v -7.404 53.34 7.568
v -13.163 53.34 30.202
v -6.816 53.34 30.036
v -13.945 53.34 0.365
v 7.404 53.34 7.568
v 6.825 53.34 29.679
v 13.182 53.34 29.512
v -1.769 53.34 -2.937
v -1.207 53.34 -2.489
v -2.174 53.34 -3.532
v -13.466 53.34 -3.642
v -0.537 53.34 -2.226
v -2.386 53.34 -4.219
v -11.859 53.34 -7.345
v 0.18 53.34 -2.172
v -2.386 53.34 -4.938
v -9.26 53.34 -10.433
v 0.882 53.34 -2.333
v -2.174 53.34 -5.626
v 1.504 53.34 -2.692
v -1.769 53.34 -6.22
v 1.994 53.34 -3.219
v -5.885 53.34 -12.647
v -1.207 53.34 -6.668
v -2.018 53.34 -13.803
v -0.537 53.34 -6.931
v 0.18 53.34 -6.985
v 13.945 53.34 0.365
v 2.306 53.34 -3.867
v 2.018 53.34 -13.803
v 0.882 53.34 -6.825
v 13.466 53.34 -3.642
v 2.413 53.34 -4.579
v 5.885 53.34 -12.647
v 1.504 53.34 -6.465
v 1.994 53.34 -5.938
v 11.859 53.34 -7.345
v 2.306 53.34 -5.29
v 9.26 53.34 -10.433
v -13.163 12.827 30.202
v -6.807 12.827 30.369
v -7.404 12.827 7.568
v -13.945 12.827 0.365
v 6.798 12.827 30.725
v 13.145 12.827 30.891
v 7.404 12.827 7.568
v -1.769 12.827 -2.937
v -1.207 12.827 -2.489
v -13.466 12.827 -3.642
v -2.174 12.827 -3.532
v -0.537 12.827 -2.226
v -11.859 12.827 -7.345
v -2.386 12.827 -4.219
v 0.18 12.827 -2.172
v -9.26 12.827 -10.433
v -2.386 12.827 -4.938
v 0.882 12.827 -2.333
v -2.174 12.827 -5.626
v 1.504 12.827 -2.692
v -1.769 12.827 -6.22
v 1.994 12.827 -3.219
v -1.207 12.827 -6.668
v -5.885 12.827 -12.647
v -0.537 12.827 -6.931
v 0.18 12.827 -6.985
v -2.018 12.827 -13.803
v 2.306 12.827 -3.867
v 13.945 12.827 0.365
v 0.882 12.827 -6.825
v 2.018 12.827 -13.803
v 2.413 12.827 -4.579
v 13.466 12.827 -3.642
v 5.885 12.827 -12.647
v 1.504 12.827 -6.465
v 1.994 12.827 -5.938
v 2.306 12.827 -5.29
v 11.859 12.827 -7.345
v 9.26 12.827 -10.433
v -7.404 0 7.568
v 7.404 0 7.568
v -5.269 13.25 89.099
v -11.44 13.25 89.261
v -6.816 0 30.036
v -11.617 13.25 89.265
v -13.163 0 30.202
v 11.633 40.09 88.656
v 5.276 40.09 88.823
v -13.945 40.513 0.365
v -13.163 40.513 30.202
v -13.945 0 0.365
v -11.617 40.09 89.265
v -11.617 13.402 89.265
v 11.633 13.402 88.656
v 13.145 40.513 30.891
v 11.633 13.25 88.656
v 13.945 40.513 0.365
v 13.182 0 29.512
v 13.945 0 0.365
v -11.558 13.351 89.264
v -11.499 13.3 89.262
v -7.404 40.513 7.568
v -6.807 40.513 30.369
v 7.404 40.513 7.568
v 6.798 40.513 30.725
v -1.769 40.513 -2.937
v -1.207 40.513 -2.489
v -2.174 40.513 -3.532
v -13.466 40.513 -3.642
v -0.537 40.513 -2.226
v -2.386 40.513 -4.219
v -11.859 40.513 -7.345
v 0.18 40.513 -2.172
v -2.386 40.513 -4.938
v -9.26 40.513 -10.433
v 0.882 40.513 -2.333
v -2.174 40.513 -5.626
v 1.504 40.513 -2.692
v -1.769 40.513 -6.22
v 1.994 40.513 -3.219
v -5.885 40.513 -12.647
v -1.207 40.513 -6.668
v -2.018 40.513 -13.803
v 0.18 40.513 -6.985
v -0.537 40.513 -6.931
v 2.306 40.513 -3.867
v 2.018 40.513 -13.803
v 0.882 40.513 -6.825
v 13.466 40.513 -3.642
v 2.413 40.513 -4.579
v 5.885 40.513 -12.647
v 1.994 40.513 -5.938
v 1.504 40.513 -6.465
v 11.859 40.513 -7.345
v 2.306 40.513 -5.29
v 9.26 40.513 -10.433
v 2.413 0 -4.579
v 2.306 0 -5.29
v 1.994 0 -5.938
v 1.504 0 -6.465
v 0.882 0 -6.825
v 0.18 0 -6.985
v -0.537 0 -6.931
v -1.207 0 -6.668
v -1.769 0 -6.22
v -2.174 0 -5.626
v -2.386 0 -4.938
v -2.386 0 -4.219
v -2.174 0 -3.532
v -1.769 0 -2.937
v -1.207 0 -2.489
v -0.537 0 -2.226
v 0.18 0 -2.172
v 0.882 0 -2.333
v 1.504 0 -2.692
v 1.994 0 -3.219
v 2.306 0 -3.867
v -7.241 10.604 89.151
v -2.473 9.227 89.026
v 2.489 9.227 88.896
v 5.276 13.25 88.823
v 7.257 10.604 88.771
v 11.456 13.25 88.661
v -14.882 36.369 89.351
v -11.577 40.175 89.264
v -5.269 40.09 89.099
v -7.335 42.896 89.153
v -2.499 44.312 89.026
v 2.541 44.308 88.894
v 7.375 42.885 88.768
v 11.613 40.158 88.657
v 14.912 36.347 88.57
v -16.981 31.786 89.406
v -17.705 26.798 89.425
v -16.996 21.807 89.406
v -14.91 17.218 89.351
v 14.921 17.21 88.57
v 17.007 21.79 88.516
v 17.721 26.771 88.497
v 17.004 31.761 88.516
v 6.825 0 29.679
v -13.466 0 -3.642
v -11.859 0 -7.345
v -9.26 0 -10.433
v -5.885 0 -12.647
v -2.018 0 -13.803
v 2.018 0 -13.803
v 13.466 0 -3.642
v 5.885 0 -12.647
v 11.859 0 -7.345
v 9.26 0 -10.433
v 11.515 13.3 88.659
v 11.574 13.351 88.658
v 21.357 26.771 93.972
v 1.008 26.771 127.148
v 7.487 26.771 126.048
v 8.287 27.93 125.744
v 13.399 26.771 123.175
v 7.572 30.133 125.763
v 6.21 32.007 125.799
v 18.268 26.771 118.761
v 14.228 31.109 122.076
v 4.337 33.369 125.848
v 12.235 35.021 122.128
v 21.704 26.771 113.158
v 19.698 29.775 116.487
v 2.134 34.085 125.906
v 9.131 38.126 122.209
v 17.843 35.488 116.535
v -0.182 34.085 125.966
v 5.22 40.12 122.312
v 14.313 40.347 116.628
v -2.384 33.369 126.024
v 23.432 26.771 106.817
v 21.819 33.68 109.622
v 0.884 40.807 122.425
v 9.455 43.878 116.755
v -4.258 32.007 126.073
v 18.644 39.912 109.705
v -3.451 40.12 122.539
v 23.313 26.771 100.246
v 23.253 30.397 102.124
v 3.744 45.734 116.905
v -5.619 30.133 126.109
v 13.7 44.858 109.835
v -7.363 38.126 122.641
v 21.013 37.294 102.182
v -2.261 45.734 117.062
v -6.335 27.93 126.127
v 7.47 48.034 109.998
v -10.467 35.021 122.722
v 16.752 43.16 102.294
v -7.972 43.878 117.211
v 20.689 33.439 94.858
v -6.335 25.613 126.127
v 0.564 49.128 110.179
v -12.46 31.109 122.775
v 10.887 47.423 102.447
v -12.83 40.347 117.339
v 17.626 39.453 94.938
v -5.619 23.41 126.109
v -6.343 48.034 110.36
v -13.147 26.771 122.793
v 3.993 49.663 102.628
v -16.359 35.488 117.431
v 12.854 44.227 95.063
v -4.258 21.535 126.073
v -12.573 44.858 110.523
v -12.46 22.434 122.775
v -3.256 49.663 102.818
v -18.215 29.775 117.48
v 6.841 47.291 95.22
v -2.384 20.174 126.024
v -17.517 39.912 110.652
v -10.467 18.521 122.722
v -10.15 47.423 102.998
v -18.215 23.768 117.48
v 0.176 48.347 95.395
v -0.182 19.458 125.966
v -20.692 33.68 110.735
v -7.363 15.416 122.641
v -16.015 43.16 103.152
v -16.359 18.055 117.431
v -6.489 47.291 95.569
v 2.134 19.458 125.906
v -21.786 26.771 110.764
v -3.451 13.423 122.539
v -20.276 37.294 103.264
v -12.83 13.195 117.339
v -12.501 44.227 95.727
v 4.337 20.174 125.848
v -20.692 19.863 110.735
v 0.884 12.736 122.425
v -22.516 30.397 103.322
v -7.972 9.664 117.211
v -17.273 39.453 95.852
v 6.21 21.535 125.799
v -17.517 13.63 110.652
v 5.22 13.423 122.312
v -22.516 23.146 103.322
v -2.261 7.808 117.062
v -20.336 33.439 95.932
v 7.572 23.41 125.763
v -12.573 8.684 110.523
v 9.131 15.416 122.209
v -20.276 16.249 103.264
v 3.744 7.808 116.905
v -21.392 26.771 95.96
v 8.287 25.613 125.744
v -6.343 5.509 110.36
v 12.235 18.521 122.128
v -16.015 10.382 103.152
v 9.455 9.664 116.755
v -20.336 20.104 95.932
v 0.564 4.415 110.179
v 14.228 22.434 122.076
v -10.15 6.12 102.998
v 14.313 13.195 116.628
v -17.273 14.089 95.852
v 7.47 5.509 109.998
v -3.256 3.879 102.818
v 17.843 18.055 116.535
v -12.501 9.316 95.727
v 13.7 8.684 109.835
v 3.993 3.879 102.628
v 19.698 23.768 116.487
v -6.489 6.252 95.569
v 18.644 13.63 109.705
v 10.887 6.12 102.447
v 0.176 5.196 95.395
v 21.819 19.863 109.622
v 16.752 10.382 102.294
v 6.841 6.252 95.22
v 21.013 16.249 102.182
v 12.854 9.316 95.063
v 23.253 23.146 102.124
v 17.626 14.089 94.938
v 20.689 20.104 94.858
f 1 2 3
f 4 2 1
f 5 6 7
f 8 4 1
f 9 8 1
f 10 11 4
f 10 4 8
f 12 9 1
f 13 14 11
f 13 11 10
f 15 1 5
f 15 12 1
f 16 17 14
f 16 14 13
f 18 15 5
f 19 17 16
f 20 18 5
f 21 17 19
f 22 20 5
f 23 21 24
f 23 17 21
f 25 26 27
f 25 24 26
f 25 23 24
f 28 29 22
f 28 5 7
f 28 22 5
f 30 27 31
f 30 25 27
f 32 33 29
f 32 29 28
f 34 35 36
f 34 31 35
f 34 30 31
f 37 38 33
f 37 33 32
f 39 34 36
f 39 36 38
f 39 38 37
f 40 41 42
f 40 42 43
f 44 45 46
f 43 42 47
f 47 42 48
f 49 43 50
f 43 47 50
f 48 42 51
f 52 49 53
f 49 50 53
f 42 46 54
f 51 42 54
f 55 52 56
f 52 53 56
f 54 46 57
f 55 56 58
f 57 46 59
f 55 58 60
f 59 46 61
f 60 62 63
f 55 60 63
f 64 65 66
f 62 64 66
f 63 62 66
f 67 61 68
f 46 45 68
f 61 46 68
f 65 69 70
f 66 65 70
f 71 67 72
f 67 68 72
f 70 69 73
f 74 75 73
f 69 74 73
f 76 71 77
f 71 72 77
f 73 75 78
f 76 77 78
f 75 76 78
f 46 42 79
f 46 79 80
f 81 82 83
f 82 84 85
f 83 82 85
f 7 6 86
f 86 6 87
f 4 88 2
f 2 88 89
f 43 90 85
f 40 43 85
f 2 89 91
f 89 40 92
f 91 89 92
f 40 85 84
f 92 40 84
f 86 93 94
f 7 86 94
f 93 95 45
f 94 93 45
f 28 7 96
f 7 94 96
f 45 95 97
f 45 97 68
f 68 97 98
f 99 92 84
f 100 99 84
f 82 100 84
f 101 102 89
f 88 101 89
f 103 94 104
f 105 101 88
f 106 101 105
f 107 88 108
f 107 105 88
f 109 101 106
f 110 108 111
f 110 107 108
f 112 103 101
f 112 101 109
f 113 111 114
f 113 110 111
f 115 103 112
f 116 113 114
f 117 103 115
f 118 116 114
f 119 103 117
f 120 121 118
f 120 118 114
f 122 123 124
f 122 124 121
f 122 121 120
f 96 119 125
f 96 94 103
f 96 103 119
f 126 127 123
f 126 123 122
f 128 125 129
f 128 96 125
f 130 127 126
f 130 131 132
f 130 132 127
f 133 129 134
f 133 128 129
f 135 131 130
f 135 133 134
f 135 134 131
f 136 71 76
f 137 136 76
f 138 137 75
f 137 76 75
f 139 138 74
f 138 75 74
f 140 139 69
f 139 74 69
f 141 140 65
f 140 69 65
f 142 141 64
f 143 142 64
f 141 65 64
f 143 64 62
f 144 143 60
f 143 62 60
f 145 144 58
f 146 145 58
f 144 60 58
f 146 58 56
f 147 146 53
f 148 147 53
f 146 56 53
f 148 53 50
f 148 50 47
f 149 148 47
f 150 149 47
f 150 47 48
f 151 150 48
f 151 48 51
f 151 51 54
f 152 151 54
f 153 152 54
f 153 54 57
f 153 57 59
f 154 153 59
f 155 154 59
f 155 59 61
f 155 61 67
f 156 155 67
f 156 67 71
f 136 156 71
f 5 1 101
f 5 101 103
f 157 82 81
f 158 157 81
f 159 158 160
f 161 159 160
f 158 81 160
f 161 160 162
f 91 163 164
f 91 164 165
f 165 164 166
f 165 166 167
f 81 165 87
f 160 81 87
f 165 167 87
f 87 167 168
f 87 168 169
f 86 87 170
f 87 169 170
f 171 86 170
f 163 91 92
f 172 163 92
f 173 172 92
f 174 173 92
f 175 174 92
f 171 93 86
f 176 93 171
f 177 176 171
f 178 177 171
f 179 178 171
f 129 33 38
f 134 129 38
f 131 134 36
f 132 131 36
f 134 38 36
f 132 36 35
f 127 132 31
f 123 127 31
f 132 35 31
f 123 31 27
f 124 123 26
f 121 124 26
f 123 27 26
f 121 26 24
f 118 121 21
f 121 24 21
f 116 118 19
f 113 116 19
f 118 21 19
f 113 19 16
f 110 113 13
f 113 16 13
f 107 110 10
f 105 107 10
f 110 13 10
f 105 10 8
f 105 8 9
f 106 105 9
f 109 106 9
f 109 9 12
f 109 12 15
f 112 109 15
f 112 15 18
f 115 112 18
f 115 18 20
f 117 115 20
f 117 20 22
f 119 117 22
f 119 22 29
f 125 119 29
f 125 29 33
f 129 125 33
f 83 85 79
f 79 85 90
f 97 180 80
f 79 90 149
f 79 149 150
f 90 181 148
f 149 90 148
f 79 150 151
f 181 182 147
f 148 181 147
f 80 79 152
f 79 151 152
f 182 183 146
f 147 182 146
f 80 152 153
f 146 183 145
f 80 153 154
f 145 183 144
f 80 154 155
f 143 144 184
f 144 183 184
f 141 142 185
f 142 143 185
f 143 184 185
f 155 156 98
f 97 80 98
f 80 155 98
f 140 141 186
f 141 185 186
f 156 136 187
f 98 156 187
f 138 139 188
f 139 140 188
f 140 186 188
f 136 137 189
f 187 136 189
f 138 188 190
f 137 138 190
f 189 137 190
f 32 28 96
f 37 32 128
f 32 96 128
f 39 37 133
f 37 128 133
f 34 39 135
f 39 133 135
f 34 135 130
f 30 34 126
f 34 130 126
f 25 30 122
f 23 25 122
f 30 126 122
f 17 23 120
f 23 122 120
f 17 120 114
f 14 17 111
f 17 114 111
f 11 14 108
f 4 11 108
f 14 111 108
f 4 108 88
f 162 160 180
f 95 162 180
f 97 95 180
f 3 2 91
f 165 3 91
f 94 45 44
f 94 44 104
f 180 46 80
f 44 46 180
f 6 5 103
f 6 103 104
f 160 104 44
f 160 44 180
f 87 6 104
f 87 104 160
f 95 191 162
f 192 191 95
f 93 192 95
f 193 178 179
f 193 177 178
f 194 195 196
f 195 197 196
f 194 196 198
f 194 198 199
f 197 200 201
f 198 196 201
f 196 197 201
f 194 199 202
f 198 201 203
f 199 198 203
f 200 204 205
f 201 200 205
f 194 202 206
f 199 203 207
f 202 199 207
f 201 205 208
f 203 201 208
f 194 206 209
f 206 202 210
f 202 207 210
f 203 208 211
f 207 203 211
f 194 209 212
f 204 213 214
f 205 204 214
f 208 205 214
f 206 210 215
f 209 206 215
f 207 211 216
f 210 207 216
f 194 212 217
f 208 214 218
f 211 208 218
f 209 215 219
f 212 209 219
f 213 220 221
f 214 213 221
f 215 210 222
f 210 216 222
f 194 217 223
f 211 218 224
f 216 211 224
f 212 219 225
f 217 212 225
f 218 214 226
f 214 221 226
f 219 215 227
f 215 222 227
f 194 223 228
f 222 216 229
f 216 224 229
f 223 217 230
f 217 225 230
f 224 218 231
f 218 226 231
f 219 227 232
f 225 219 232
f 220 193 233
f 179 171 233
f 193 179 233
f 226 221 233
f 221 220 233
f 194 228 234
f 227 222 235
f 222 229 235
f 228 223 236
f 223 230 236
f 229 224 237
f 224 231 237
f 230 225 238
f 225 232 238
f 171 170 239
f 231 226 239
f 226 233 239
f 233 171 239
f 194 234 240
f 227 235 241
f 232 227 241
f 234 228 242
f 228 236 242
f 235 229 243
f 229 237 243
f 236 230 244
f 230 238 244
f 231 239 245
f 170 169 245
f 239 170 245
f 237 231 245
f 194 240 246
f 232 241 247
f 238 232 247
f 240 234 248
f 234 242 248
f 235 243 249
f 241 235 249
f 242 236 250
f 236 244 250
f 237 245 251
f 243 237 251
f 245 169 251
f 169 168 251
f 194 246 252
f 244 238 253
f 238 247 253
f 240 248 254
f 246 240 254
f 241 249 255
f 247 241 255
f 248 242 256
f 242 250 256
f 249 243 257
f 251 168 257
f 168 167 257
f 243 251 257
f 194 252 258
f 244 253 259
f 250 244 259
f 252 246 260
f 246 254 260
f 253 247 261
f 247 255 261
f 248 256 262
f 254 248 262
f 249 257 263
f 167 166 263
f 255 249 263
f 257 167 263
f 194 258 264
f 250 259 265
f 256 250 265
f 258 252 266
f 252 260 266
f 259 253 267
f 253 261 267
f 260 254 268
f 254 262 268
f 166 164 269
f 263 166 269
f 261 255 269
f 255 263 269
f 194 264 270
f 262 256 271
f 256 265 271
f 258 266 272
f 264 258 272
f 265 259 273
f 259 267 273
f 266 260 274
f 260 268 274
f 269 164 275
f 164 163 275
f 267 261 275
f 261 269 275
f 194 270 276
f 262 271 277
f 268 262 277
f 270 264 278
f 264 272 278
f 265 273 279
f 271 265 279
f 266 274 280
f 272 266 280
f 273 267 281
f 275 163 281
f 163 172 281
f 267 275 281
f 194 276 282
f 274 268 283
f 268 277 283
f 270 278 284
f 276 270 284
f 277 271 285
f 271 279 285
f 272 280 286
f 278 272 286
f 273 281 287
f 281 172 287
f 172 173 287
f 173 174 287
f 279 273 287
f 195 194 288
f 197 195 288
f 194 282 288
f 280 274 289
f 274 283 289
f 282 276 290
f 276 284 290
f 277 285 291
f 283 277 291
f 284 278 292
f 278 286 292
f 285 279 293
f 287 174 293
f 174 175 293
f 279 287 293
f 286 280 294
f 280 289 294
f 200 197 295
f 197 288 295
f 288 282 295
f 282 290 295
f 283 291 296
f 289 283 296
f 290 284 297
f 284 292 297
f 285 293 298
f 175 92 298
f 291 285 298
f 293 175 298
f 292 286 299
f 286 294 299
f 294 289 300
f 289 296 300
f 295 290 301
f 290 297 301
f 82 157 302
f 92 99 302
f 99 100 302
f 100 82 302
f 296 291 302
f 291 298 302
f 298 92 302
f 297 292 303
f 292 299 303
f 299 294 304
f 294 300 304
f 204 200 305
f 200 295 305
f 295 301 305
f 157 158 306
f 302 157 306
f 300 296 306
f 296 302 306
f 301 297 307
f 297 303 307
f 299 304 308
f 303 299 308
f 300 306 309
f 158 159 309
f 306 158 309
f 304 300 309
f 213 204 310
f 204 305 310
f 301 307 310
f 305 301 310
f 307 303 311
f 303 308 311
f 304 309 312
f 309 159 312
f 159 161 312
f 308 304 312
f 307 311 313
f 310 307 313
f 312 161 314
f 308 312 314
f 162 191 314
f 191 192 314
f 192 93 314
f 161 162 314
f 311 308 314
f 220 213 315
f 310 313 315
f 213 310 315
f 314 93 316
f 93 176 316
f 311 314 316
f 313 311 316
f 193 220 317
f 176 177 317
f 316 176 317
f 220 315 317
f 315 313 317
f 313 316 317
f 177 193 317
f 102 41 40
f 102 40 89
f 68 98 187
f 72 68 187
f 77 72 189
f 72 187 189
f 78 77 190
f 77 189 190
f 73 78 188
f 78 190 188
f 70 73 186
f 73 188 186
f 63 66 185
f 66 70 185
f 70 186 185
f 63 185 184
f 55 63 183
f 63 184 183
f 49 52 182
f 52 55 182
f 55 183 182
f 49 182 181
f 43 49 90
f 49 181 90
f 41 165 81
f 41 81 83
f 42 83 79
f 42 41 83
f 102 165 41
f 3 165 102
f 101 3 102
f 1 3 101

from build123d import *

# Parameters (mm, degrees)
BOSS_EXTRUDE1_DEPTH     = 53.34
SKETCH4_W               = 61.072672184
SKETCH4_H               = 27.686
CUT_EXTRUDE3_DEPTH      = 125.557157077
SKETCH5_OUTSIDE_W       = 57.352
SKETCH5_OUTSIDE_H       = 152.814
CUT_EXTRUDE5_DEPTH      = 123.51837945
SKETCH6_R               = 2.413
CUT_EXTRUDE6_DEPTH      = 123.51837945
CUT_EXTRUDE8_DEPTH      = 100
CUT_EXTRUDE8_DEPTH_BACK = 100
CUT_EXTRUDE9_DEPTH      = 100


with BuildPart() as part:
    # Sketch1 → Boss-Extrude1 (new body)
    with BuildSketch(Plane(origin=(0, 0, 0), x_dir=(1, 0, 0), z_dir=(0, 1, 0))):
        with BuildLine():
            Line((-13.944778991, -0.365156889), (-11.616850564, -89.265156889))
            ThreePointArc((-11.616850564, -89.265156889), (0, -109.412099434), (11.616850564, -89.265156889))
            Line((11.616850564, -89.265156889), (13.944778991, -0.365156889))
            ThreePointArc((13.944778991, -0.365156889), (0, 13.949559157), (-13.944778991, -0.365156889))
        make_face()
    extrude(amount=BOSS_EXTRUDE1_DEPTH)

    # Sketch4 → Cut-Extrude3 (cut, through all)
    with BuildSketch(Plane(origin=(13.944778991, 0, 0.365156889), x_dir=(0.026176948307873094, 0, -0.9996573249755574), z_dir=(0.9996573249755573, 0, 0.02617694830787309))):
        with Locations((0, 26.67)):
            Rectangle(SKETCH4_W, SKETCH4_H)
    extrude(amount=-CUT_EXTRUDE3_DEPTH, mode=Mode.SUBTRACT)

    # Sketch5 outside → Cut-Extrude5 (cut, through all)
    # profile 1 of 2: a face of its own
    with BuildSketch(Plane(origin=(0, 53.34, 0), x_dir=(1, 0, 0), z_dir=(0, 1, 0))):
        with Locations((0, -47.731)):
            Rectangle(SKETCH5_OUTSIDE_W, SKETCH5_OUTSIDE_H)
        with BuildLine():
            Line((-13.944778991, -0.365156889), (-11.616850564, -89.265156889))
            ThreePointArc((-11.616850564, -89.265156889), (0, -109.412099434), (11.616850564, -89.265156889))
            Line((11.616850564, -89.265156889), (13.944778991, -0.365156889))
            ThreePointArc((13.944778991, -0.365156889), (0, 13.949559157), (-13.944778991, -0.365156889))
        make_face(mode=Mode.SUBTRACT)
    # profile 2 of 2: a face of its own
    with BuildSketch(Plane(origin=(0, 53.34, 0), x_dir=(1, 0, 0), z_dir=(0, 1, 0))):
        with BuildLine():
            Line((7.403977553, -7.568443783), (5.213735587, -91.210409969))
            ThreePointArc((5.213735587, -91.210409969), (0, -105.33899845), (-5.213735587, -91.210409969))
            Line((-5.213735587, -91.210409969), (-7.403977553, -7.568443783))
            Line((-7.403977553, -7.568443783), (7.403977553, -7.568443783))
        make_face()
    extrude(amount=-CUT_EXTRUDE5_DEPTH, mode=Mode.SUBTRACT)

    # Sketch6 → Cut-Extrude6 (cut, through all)
    with BuildSketch(Plane(origin=(0, 53.34, 0), x_dir=(1, 0, 0), z_dir=(0, 1, 0))):
        with Locations((0, 4.57874024)):
            Circle(SKETCH6_R)
    extrude(amount=-CUT_EXTRUDE6_DEPTH, mode=Mode.SUBTRACT)

    # Sketch7 → Cut-Extrude8 (cut, two sides: drawn at the far end of the back side and taken through both)
    with BuildSketch(Plane(origin=(-13.944778991, 0, 0.365156889), x_dir=(0.02617694830787368, 0, 0.9996573249755574), z_dir=(-0.9996573249755574, 0, 0.02617694830787368)).offset(-CUT_EXTRUDE8_DEPTH_BACK)):
        Polygon((138.702727396, 53.34), (29.847177093, 53.34), (88.930474252, 40.09), (115.196693912, 40.09), (115.196693912, 13.25), (88.930474252, 13.25), (29.847177093, 0), (138.702727396, 0), align=None)
    extrude(amount=CUT_EXTRUDE8_DEPTH + CUT_EXTRUDE8_DEPTH_BACK, mode=Mode.SUBTRACT)

    # Sketch8 → Cut-Extrude9 (cut)
    with BuildSketch(Plane(origin=(0, 40.09, 0), x_dir=(1, 0, 0), z_dir=(0, 1, 0))):
        Polygon((-11.616850564, -89.265156889), (19.748470708, -88.443827046), (21.136276119, -119.73242467), (-27.769338844, -116.21935592), (-20.465853811, -89.265156889), align=None)
    extrude(amount=-CUT_EXTRUDE9_DEPTH, mode=Mode.SUBTRACT)

    # Sketch14 → Revolve6 (revolve)
    with BuildSketch(Plane(origin=(0, 26.771336555, 0), x_dir=(-0.9996573249755574, 0, 0.02617694830787441), z_dir=(0, 1, 0))):
        with BuildLine():
            Line((2.320752522, 88.930474252), (13.949559157, 88.930474252))
            Line((13.949559157, 88.930474252), (20.039899636, 88.930474252))
            ThreePointArc((20.039899636, 88.930474252), (24.11470465, 95.938974296), (25.530552865, 103.921360067))
            ThreePointArc((25.530552865, 103.921360067), (18.732559735, 120.33316728), (2.320752522, 127.13116041))
            Line((2.320752522, 127.13116041), (2.320752522, 103.921360067))
            Line((2.320752522, 103.921360067), (2.320752522, 88.930474252))
        make_face()
    revolve(axis=Axis((0.400386812, 26.771336555, 103.946499032), (0.026176948307874422, 0, 0.9996573249755573)))


solid = part.part
